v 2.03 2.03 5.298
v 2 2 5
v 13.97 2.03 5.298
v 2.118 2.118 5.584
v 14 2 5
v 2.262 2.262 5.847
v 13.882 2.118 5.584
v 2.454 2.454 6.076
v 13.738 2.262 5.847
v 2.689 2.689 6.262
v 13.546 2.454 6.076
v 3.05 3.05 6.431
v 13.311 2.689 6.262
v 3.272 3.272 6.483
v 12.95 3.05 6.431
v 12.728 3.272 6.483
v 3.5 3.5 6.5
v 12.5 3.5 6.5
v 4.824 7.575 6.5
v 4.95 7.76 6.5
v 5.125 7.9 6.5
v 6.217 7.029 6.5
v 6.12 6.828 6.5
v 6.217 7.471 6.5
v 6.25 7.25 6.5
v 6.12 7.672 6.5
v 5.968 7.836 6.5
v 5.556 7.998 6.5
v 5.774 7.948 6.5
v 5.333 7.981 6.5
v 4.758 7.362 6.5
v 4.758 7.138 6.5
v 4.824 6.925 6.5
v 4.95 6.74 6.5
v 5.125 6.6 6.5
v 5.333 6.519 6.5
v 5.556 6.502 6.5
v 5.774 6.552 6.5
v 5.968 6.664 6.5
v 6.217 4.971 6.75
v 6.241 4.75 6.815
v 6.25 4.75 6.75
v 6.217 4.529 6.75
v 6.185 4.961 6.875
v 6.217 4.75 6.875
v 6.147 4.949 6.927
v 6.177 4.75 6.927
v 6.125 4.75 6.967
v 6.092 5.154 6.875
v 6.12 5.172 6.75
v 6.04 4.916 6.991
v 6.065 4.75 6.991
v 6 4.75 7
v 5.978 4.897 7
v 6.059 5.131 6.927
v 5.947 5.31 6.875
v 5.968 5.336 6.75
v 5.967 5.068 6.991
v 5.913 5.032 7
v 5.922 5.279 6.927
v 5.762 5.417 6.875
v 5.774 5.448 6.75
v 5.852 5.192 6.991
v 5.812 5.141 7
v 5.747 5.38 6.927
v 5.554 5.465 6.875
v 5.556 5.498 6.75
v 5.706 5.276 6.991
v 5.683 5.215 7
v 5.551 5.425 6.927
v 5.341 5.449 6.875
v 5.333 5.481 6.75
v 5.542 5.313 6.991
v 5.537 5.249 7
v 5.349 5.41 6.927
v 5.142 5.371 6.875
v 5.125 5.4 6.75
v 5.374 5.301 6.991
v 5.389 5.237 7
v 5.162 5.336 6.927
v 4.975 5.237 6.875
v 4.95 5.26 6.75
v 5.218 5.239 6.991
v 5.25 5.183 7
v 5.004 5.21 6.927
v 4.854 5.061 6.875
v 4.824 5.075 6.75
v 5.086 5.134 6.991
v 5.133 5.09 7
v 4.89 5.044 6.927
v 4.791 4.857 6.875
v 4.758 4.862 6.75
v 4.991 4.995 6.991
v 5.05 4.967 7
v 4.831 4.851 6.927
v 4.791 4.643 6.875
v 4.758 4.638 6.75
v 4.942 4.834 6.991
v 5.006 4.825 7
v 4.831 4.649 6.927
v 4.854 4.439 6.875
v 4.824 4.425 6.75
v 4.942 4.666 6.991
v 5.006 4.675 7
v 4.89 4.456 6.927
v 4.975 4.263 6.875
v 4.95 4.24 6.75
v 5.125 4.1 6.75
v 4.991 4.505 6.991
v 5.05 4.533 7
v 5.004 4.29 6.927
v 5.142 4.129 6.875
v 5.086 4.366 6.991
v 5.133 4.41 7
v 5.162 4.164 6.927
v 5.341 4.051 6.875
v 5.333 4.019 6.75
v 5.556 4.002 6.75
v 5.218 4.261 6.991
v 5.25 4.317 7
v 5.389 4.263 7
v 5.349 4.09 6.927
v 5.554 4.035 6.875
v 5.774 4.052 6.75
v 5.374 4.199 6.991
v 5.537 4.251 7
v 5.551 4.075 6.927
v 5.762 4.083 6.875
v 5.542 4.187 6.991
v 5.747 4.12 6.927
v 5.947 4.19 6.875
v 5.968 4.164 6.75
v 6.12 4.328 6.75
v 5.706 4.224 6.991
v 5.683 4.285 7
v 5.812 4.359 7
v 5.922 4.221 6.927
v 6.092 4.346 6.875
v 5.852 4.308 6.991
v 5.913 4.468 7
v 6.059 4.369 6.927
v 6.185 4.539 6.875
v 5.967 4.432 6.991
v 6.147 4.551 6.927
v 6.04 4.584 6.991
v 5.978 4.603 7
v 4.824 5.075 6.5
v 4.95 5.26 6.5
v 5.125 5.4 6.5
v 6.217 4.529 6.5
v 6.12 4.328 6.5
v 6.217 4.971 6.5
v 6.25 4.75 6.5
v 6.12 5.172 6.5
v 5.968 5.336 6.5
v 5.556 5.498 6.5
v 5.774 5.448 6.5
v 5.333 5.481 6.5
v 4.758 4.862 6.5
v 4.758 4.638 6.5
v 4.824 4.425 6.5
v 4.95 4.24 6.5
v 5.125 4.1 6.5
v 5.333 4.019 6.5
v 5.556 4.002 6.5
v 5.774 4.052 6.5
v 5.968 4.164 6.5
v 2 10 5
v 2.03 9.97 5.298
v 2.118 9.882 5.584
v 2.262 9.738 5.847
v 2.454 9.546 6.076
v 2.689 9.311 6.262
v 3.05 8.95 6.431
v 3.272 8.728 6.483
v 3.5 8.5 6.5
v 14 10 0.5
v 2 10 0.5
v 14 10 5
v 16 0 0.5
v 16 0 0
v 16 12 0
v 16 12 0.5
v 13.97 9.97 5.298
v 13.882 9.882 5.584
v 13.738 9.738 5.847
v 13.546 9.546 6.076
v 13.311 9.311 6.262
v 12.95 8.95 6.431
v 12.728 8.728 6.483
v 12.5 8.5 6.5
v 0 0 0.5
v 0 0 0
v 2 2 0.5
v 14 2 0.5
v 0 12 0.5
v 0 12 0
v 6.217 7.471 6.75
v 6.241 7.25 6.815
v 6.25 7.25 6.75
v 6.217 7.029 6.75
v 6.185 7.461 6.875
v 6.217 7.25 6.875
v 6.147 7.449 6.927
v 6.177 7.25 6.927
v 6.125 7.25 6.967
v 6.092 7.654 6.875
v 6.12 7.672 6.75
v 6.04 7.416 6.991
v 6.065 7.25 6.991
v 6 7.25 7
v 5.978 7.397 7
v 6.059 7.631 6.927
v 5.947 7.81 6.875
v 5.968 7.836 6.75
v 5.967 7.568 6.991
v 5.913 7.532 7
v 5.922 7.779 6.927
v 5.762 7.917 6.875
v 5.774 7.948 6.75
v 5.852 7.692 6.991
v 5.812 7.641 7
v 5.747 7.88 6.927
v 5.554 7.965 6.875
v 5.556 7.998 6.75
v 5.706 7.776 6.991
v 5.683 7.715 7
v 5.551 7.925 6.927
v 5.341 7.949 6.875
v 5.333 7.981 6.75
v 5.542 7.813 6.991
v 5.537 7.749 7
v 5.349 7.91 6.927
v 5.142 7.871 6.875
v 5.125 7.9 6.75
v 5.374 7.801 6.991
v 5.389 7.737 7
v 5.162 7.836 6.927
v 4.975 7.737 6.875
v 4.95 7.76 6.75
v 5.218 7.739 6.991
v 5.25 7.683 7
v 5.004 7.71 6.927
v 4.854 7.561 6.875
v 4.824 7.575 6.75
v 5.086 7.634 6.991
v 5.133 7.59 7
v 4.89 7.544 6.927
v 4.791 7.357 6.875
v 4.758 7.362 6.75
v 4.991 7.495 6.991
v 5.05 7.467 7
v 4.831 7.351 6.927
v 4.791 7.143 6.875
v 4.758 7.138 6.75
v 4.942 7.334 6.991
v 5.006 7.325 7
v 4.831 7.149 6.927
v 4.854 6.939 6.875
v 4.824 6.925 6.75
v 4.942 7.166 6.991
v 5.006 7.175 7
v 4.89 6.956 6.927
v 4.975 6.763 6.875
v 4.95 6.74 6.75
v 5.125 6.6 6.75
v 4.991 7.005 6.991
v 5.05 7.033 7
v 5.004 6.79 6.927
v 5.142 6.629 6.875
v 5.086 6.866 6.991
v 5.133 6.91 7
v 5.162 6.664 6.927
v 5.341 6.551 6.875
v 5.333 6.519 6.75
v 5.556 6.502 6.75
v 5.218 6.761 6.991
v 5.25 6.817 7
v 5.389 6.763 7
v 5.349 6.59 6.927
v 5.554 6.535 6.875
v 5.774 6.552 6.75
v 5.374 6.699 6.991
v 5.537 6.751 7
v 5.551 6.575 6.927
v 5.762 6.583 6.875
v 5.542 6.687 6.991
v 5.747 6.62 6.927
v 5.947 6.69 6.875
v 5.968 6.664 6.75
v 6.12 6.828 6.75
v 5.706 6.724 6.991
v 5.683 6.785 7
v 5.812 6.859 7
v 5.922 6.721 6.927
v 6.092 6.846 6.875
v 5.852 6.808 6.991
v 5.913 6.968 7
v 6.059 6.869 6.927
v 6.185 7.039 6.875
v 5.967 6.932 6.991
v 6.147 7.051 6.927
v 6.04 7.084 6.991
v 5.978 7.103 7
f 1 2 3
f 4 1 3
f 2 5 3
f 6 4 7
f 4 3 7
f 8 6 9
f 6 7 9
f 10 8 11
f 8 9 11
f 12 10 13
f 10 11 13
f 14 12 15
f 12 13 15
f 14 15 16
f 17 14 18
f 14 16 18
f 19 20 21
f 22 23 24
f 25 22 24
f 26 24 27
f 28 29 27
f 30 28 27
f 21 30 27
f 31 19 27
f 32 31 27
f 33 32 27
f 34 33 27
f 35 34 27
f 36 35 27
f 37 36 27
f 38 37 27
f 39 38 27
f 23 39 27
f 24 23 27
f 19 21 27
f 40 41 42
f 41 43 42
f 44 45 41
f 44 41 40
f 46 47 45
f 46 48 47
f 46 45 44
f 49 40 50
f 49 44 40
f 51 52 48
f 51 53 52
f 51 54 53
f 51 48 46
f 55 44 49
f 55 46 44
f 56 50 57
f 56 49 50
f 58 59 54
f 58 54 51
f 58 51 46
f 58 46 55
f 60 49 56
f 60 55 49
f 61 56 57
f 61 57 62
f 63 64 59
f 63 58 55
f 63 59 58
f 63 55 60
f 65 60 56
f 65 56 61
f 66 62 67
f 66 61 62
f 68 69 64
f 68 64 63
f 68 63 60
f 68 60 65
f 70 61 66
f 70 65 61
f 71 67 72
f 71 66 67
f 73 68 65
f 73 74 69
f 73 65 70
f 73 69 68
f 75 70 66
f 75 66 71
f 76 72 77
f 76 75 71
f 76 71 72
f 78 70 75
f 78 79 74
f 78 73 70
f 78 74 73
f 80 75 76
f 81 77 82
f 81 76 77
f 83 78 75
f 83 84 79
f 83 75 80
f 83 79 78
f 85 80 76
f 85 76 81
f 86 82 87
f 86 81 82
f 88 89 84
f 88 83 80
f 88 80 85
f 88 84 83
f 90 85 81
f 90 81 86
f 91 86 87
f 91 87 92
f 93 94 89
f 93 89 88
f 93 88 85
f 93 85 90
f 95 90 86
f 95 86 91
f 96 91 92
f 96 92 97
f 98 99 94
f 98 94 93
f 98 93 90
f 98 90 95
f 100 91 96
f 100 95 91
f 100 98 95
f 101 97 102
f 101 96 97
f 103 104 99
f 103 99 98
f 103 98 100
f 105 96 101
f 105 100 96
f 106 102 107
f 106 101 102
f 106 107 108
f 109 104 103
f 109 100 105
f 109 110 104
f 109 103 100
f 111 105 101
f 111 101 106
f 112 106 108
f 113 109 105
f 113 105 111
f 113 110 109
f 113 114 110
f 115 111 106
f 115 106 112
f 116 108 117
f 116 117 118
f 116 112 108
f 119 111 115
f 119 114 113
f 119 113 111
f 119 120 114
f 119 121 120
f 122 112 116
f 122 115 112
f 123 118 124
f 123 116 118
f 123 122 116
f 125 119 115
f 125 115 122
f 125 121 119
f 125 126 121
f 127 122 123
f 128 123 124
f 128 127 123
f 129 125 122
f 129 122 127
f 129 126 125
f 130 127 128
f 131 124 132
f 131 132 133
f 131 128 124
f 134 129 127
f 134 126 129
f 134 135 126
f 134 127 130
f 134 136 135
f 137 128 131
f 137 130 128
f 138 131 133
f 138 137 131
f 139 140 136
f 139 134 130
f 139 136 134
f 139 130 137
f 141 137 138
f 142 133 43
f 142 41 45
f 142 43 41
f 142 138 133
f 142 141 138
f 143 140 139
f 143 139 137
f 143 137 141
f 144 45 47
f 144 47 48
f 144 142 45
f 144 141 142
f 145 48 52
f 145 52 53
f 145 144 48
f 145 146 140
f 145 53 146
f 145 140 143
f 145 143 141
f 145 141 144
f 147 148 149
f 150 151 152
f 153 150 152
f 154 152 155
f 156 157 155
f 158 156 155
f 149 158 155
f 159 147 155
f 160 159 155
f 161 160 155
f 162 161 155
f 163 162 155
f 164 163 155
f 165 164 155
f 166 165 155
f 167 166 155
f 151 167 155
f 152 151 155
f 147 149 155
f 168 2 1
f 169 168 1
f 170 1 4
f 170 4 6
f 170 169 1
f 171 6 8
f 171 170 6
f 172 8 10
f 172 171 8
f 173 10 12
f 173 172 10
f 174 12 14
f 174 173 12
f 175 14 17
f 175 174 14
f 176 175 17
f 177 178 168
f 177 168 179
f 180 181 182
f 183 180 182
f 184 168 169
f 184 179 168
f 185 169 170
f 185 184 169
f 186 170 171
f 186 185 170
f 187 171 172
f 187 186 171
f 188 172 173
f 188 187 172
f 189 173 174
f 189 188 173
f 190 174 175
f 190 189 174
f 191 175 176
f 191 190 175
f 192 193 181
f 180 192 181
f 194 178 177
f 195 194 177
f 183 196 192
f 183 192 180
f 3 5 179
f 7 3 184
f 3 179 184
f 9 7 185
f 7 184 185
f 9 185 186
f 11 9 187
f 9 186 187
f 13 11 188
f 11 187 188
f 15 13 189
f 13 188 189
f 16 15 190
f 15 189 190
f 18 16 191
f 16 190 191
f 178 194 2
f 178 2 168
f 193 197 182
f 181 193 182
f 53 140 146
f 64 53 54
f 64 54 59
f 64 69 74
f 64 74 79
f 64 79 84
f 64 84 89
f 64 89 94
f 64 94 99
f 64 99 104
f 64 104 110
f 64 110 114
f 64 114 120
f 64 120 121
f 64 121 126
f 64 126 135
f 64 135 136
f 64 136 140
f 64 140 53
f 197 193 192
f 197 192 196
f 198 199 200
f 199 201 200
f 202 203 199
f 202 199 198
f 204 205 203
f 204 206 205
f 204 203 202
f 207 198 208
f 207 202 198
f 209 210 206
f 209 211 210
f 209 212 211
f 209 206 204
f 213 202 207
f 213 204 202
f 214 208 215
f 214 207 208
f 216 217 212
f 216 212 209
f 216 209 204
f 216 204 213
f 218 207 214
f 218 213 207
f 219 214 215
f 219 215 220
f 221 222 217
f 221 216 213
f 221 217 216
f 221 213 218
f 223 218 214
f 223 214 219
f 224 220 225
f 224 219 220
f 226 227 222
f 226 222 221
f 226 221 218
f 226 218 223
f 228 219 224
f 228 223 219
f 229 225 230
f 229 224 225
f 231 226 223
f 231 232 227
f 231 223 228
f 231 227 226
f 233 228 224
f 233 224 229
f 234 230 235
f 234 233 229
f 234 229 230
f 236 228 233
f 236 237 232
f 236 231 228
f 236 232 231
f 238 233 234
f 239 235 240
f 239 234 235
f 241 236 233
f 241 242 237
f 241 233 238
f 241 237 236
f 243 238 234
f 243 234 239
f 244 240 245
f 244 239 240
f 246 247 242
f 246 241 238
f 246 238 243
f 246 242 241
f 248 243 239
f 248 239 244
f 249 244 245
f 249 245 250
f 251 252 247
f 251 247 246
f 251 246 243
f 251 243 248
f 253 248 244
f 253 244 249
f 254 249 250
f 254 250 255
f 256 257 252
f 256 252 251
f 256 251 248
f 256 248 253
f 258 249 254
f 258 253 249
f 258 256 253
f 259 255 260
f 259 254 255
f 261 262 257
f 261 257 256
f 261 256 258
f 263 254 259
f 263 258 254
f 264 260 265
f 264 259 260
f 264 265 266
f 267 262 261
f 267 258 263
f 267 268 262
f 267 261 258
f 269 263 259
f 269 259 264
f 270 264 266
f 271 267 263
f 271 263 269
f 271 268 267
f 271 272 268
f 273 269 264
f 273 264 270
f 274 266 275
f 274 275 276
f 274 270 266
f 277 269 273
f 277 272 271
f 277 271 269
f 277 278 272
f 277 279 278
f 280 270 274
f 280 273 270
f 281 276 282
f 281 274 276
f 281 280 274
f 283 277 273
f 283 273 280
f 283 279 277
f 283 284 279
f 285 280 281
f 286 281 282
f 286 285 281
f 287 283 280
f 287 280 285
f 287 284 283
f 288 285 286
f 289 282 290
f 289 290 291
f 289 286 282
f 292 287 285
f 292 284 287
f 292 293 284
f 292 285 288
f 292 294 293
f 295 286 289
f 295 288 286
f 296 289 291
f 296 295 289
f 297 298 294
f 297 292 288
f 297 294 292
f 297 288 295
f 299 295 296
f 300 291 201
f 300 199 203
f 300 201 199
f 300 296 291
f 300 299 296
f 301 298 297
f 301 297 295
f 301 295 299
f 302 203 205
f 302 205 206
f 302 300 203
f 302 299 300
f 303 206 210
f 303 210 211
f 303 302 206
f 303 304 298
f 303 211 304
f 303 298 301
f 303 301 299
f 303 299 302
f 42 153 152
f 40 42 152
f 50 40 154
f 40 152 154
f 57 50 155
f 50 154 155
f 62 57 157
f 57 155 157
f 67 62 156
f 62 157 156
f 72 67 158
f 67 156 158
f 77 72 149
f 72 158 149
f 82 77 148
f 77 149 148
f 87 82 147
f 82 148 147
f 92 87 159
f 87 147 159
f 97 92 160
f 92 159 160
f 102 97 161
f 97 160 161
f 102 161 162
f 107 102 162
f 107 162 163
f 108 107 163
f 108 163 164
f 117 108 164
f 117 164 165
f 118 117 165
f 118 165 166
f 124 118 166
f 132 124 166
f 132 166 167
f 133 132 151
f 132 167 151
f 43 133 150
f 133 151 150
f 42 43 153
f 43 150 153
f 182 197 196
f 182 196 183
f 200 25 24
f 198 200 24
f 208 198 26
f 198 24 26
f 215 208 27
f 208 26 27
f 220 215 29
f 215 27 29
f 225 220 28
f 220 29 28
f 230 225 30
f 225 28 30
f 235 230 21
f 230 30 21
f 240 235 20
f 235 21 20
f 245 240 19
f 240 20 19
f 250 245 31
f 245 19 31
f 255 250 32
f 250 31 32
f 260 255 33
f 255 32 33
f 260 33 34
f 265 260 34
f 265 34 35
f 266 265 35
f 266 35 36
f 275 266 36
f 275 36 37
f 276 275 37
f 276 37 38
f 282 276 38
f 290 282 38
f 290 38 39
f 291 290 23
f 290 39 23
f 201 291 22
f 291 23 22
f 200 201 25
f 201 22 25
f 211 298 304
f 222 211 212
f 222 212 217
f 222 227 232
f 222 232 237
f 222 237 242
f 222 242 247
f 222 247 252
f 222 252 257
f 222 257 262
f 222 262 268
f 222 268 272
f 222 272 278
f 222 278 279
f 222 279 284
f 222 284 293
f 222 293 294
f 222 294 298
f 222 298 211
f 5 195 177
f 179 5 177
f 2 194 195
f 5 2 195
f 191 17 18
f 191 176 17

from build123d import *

# Parameters (mm, degrees)
SKETCH_W     = 16
SKETCH_H     = 12
PAD_DEPTH    = 0.5
SKETCH001_W  = 12
SKETCH001_H  = 8
PAD001_DEPTH = 6
FILLET_R     = 1.5
SKETCH002_R  = 0.75
PAD002_DEPTH = 0.5
FILLET001_R  = 0.25
SKETCH004_R  = 0.75
PAD004_DEPTH = 0.5
FILLET003_R  = 0.25


with BuildPart() as pad:
    # Sketch → Pad (new body)
    with BuildSketch(Plane.XY):
        with Locations((8, 6)):
            Rectangle(SKETCH_W, SKETCH_H)
    extrude(amount=PAD_DEPTH)


with BuildPart() as fillet_body:
    # Sketch001 → Pad001 (new body)
    with BuildSketch(Plane.XY.offset(0.5)):
        with Locations((8, 6)):
            Rectangle(SKETCH001_W, SKETCH001_H)
    extrude(amount=PAD001_DEPTH)

    # Fillet
    fillet_edges = [fillet_body.edges().sort_by_distance(p)[0] for p in [
        (8, 2, 6.5),
        (14, 6, 6.5),
        (8, 10, 6.5),
        (2, 6, 6.5),
    ]]
    fillet(fillet_edges, radius=FILLET_R)


with BuildPart() as fillet001:
    # Sketch002 → Pad002 (new body)
    with BuildSketch(Plane.XY.offset(6.5)):
        with Locations((5.5, 4.75)):
            Circle(SKETCH002_R)
    extrude(amount=PAD002_DEPTH)

    # Fillet001
    fillet001_edges = [fillet001.edges().sort_by_distance(p)[0] for p in [
        (4.75, 4.75, 7),
    ]]
    fillet(fillet001_edges, radius=FILLET001_R)


with BuildPart() as fillet003:
    # Sketch004 → Pad004 (new body)
    with BuildSketch(Plane.XY.offset(6.5)):
        with Locations((5.5, 7.25)):
            Circle(SKETCH004_R)
    extrude(amount=PAD004_DEPTH)

    # Fillet003
    fillet003_edges = [fillet003.edges().sort_by_distance(p)[0] for p in [
        (4.75, 7.25, 7),
    ]]
    fillet(fillet003_edges, radius=FILLET003_R)


solid = Compound([pad.part, fillet_body.part, fillet001.part, fillet003.part])
